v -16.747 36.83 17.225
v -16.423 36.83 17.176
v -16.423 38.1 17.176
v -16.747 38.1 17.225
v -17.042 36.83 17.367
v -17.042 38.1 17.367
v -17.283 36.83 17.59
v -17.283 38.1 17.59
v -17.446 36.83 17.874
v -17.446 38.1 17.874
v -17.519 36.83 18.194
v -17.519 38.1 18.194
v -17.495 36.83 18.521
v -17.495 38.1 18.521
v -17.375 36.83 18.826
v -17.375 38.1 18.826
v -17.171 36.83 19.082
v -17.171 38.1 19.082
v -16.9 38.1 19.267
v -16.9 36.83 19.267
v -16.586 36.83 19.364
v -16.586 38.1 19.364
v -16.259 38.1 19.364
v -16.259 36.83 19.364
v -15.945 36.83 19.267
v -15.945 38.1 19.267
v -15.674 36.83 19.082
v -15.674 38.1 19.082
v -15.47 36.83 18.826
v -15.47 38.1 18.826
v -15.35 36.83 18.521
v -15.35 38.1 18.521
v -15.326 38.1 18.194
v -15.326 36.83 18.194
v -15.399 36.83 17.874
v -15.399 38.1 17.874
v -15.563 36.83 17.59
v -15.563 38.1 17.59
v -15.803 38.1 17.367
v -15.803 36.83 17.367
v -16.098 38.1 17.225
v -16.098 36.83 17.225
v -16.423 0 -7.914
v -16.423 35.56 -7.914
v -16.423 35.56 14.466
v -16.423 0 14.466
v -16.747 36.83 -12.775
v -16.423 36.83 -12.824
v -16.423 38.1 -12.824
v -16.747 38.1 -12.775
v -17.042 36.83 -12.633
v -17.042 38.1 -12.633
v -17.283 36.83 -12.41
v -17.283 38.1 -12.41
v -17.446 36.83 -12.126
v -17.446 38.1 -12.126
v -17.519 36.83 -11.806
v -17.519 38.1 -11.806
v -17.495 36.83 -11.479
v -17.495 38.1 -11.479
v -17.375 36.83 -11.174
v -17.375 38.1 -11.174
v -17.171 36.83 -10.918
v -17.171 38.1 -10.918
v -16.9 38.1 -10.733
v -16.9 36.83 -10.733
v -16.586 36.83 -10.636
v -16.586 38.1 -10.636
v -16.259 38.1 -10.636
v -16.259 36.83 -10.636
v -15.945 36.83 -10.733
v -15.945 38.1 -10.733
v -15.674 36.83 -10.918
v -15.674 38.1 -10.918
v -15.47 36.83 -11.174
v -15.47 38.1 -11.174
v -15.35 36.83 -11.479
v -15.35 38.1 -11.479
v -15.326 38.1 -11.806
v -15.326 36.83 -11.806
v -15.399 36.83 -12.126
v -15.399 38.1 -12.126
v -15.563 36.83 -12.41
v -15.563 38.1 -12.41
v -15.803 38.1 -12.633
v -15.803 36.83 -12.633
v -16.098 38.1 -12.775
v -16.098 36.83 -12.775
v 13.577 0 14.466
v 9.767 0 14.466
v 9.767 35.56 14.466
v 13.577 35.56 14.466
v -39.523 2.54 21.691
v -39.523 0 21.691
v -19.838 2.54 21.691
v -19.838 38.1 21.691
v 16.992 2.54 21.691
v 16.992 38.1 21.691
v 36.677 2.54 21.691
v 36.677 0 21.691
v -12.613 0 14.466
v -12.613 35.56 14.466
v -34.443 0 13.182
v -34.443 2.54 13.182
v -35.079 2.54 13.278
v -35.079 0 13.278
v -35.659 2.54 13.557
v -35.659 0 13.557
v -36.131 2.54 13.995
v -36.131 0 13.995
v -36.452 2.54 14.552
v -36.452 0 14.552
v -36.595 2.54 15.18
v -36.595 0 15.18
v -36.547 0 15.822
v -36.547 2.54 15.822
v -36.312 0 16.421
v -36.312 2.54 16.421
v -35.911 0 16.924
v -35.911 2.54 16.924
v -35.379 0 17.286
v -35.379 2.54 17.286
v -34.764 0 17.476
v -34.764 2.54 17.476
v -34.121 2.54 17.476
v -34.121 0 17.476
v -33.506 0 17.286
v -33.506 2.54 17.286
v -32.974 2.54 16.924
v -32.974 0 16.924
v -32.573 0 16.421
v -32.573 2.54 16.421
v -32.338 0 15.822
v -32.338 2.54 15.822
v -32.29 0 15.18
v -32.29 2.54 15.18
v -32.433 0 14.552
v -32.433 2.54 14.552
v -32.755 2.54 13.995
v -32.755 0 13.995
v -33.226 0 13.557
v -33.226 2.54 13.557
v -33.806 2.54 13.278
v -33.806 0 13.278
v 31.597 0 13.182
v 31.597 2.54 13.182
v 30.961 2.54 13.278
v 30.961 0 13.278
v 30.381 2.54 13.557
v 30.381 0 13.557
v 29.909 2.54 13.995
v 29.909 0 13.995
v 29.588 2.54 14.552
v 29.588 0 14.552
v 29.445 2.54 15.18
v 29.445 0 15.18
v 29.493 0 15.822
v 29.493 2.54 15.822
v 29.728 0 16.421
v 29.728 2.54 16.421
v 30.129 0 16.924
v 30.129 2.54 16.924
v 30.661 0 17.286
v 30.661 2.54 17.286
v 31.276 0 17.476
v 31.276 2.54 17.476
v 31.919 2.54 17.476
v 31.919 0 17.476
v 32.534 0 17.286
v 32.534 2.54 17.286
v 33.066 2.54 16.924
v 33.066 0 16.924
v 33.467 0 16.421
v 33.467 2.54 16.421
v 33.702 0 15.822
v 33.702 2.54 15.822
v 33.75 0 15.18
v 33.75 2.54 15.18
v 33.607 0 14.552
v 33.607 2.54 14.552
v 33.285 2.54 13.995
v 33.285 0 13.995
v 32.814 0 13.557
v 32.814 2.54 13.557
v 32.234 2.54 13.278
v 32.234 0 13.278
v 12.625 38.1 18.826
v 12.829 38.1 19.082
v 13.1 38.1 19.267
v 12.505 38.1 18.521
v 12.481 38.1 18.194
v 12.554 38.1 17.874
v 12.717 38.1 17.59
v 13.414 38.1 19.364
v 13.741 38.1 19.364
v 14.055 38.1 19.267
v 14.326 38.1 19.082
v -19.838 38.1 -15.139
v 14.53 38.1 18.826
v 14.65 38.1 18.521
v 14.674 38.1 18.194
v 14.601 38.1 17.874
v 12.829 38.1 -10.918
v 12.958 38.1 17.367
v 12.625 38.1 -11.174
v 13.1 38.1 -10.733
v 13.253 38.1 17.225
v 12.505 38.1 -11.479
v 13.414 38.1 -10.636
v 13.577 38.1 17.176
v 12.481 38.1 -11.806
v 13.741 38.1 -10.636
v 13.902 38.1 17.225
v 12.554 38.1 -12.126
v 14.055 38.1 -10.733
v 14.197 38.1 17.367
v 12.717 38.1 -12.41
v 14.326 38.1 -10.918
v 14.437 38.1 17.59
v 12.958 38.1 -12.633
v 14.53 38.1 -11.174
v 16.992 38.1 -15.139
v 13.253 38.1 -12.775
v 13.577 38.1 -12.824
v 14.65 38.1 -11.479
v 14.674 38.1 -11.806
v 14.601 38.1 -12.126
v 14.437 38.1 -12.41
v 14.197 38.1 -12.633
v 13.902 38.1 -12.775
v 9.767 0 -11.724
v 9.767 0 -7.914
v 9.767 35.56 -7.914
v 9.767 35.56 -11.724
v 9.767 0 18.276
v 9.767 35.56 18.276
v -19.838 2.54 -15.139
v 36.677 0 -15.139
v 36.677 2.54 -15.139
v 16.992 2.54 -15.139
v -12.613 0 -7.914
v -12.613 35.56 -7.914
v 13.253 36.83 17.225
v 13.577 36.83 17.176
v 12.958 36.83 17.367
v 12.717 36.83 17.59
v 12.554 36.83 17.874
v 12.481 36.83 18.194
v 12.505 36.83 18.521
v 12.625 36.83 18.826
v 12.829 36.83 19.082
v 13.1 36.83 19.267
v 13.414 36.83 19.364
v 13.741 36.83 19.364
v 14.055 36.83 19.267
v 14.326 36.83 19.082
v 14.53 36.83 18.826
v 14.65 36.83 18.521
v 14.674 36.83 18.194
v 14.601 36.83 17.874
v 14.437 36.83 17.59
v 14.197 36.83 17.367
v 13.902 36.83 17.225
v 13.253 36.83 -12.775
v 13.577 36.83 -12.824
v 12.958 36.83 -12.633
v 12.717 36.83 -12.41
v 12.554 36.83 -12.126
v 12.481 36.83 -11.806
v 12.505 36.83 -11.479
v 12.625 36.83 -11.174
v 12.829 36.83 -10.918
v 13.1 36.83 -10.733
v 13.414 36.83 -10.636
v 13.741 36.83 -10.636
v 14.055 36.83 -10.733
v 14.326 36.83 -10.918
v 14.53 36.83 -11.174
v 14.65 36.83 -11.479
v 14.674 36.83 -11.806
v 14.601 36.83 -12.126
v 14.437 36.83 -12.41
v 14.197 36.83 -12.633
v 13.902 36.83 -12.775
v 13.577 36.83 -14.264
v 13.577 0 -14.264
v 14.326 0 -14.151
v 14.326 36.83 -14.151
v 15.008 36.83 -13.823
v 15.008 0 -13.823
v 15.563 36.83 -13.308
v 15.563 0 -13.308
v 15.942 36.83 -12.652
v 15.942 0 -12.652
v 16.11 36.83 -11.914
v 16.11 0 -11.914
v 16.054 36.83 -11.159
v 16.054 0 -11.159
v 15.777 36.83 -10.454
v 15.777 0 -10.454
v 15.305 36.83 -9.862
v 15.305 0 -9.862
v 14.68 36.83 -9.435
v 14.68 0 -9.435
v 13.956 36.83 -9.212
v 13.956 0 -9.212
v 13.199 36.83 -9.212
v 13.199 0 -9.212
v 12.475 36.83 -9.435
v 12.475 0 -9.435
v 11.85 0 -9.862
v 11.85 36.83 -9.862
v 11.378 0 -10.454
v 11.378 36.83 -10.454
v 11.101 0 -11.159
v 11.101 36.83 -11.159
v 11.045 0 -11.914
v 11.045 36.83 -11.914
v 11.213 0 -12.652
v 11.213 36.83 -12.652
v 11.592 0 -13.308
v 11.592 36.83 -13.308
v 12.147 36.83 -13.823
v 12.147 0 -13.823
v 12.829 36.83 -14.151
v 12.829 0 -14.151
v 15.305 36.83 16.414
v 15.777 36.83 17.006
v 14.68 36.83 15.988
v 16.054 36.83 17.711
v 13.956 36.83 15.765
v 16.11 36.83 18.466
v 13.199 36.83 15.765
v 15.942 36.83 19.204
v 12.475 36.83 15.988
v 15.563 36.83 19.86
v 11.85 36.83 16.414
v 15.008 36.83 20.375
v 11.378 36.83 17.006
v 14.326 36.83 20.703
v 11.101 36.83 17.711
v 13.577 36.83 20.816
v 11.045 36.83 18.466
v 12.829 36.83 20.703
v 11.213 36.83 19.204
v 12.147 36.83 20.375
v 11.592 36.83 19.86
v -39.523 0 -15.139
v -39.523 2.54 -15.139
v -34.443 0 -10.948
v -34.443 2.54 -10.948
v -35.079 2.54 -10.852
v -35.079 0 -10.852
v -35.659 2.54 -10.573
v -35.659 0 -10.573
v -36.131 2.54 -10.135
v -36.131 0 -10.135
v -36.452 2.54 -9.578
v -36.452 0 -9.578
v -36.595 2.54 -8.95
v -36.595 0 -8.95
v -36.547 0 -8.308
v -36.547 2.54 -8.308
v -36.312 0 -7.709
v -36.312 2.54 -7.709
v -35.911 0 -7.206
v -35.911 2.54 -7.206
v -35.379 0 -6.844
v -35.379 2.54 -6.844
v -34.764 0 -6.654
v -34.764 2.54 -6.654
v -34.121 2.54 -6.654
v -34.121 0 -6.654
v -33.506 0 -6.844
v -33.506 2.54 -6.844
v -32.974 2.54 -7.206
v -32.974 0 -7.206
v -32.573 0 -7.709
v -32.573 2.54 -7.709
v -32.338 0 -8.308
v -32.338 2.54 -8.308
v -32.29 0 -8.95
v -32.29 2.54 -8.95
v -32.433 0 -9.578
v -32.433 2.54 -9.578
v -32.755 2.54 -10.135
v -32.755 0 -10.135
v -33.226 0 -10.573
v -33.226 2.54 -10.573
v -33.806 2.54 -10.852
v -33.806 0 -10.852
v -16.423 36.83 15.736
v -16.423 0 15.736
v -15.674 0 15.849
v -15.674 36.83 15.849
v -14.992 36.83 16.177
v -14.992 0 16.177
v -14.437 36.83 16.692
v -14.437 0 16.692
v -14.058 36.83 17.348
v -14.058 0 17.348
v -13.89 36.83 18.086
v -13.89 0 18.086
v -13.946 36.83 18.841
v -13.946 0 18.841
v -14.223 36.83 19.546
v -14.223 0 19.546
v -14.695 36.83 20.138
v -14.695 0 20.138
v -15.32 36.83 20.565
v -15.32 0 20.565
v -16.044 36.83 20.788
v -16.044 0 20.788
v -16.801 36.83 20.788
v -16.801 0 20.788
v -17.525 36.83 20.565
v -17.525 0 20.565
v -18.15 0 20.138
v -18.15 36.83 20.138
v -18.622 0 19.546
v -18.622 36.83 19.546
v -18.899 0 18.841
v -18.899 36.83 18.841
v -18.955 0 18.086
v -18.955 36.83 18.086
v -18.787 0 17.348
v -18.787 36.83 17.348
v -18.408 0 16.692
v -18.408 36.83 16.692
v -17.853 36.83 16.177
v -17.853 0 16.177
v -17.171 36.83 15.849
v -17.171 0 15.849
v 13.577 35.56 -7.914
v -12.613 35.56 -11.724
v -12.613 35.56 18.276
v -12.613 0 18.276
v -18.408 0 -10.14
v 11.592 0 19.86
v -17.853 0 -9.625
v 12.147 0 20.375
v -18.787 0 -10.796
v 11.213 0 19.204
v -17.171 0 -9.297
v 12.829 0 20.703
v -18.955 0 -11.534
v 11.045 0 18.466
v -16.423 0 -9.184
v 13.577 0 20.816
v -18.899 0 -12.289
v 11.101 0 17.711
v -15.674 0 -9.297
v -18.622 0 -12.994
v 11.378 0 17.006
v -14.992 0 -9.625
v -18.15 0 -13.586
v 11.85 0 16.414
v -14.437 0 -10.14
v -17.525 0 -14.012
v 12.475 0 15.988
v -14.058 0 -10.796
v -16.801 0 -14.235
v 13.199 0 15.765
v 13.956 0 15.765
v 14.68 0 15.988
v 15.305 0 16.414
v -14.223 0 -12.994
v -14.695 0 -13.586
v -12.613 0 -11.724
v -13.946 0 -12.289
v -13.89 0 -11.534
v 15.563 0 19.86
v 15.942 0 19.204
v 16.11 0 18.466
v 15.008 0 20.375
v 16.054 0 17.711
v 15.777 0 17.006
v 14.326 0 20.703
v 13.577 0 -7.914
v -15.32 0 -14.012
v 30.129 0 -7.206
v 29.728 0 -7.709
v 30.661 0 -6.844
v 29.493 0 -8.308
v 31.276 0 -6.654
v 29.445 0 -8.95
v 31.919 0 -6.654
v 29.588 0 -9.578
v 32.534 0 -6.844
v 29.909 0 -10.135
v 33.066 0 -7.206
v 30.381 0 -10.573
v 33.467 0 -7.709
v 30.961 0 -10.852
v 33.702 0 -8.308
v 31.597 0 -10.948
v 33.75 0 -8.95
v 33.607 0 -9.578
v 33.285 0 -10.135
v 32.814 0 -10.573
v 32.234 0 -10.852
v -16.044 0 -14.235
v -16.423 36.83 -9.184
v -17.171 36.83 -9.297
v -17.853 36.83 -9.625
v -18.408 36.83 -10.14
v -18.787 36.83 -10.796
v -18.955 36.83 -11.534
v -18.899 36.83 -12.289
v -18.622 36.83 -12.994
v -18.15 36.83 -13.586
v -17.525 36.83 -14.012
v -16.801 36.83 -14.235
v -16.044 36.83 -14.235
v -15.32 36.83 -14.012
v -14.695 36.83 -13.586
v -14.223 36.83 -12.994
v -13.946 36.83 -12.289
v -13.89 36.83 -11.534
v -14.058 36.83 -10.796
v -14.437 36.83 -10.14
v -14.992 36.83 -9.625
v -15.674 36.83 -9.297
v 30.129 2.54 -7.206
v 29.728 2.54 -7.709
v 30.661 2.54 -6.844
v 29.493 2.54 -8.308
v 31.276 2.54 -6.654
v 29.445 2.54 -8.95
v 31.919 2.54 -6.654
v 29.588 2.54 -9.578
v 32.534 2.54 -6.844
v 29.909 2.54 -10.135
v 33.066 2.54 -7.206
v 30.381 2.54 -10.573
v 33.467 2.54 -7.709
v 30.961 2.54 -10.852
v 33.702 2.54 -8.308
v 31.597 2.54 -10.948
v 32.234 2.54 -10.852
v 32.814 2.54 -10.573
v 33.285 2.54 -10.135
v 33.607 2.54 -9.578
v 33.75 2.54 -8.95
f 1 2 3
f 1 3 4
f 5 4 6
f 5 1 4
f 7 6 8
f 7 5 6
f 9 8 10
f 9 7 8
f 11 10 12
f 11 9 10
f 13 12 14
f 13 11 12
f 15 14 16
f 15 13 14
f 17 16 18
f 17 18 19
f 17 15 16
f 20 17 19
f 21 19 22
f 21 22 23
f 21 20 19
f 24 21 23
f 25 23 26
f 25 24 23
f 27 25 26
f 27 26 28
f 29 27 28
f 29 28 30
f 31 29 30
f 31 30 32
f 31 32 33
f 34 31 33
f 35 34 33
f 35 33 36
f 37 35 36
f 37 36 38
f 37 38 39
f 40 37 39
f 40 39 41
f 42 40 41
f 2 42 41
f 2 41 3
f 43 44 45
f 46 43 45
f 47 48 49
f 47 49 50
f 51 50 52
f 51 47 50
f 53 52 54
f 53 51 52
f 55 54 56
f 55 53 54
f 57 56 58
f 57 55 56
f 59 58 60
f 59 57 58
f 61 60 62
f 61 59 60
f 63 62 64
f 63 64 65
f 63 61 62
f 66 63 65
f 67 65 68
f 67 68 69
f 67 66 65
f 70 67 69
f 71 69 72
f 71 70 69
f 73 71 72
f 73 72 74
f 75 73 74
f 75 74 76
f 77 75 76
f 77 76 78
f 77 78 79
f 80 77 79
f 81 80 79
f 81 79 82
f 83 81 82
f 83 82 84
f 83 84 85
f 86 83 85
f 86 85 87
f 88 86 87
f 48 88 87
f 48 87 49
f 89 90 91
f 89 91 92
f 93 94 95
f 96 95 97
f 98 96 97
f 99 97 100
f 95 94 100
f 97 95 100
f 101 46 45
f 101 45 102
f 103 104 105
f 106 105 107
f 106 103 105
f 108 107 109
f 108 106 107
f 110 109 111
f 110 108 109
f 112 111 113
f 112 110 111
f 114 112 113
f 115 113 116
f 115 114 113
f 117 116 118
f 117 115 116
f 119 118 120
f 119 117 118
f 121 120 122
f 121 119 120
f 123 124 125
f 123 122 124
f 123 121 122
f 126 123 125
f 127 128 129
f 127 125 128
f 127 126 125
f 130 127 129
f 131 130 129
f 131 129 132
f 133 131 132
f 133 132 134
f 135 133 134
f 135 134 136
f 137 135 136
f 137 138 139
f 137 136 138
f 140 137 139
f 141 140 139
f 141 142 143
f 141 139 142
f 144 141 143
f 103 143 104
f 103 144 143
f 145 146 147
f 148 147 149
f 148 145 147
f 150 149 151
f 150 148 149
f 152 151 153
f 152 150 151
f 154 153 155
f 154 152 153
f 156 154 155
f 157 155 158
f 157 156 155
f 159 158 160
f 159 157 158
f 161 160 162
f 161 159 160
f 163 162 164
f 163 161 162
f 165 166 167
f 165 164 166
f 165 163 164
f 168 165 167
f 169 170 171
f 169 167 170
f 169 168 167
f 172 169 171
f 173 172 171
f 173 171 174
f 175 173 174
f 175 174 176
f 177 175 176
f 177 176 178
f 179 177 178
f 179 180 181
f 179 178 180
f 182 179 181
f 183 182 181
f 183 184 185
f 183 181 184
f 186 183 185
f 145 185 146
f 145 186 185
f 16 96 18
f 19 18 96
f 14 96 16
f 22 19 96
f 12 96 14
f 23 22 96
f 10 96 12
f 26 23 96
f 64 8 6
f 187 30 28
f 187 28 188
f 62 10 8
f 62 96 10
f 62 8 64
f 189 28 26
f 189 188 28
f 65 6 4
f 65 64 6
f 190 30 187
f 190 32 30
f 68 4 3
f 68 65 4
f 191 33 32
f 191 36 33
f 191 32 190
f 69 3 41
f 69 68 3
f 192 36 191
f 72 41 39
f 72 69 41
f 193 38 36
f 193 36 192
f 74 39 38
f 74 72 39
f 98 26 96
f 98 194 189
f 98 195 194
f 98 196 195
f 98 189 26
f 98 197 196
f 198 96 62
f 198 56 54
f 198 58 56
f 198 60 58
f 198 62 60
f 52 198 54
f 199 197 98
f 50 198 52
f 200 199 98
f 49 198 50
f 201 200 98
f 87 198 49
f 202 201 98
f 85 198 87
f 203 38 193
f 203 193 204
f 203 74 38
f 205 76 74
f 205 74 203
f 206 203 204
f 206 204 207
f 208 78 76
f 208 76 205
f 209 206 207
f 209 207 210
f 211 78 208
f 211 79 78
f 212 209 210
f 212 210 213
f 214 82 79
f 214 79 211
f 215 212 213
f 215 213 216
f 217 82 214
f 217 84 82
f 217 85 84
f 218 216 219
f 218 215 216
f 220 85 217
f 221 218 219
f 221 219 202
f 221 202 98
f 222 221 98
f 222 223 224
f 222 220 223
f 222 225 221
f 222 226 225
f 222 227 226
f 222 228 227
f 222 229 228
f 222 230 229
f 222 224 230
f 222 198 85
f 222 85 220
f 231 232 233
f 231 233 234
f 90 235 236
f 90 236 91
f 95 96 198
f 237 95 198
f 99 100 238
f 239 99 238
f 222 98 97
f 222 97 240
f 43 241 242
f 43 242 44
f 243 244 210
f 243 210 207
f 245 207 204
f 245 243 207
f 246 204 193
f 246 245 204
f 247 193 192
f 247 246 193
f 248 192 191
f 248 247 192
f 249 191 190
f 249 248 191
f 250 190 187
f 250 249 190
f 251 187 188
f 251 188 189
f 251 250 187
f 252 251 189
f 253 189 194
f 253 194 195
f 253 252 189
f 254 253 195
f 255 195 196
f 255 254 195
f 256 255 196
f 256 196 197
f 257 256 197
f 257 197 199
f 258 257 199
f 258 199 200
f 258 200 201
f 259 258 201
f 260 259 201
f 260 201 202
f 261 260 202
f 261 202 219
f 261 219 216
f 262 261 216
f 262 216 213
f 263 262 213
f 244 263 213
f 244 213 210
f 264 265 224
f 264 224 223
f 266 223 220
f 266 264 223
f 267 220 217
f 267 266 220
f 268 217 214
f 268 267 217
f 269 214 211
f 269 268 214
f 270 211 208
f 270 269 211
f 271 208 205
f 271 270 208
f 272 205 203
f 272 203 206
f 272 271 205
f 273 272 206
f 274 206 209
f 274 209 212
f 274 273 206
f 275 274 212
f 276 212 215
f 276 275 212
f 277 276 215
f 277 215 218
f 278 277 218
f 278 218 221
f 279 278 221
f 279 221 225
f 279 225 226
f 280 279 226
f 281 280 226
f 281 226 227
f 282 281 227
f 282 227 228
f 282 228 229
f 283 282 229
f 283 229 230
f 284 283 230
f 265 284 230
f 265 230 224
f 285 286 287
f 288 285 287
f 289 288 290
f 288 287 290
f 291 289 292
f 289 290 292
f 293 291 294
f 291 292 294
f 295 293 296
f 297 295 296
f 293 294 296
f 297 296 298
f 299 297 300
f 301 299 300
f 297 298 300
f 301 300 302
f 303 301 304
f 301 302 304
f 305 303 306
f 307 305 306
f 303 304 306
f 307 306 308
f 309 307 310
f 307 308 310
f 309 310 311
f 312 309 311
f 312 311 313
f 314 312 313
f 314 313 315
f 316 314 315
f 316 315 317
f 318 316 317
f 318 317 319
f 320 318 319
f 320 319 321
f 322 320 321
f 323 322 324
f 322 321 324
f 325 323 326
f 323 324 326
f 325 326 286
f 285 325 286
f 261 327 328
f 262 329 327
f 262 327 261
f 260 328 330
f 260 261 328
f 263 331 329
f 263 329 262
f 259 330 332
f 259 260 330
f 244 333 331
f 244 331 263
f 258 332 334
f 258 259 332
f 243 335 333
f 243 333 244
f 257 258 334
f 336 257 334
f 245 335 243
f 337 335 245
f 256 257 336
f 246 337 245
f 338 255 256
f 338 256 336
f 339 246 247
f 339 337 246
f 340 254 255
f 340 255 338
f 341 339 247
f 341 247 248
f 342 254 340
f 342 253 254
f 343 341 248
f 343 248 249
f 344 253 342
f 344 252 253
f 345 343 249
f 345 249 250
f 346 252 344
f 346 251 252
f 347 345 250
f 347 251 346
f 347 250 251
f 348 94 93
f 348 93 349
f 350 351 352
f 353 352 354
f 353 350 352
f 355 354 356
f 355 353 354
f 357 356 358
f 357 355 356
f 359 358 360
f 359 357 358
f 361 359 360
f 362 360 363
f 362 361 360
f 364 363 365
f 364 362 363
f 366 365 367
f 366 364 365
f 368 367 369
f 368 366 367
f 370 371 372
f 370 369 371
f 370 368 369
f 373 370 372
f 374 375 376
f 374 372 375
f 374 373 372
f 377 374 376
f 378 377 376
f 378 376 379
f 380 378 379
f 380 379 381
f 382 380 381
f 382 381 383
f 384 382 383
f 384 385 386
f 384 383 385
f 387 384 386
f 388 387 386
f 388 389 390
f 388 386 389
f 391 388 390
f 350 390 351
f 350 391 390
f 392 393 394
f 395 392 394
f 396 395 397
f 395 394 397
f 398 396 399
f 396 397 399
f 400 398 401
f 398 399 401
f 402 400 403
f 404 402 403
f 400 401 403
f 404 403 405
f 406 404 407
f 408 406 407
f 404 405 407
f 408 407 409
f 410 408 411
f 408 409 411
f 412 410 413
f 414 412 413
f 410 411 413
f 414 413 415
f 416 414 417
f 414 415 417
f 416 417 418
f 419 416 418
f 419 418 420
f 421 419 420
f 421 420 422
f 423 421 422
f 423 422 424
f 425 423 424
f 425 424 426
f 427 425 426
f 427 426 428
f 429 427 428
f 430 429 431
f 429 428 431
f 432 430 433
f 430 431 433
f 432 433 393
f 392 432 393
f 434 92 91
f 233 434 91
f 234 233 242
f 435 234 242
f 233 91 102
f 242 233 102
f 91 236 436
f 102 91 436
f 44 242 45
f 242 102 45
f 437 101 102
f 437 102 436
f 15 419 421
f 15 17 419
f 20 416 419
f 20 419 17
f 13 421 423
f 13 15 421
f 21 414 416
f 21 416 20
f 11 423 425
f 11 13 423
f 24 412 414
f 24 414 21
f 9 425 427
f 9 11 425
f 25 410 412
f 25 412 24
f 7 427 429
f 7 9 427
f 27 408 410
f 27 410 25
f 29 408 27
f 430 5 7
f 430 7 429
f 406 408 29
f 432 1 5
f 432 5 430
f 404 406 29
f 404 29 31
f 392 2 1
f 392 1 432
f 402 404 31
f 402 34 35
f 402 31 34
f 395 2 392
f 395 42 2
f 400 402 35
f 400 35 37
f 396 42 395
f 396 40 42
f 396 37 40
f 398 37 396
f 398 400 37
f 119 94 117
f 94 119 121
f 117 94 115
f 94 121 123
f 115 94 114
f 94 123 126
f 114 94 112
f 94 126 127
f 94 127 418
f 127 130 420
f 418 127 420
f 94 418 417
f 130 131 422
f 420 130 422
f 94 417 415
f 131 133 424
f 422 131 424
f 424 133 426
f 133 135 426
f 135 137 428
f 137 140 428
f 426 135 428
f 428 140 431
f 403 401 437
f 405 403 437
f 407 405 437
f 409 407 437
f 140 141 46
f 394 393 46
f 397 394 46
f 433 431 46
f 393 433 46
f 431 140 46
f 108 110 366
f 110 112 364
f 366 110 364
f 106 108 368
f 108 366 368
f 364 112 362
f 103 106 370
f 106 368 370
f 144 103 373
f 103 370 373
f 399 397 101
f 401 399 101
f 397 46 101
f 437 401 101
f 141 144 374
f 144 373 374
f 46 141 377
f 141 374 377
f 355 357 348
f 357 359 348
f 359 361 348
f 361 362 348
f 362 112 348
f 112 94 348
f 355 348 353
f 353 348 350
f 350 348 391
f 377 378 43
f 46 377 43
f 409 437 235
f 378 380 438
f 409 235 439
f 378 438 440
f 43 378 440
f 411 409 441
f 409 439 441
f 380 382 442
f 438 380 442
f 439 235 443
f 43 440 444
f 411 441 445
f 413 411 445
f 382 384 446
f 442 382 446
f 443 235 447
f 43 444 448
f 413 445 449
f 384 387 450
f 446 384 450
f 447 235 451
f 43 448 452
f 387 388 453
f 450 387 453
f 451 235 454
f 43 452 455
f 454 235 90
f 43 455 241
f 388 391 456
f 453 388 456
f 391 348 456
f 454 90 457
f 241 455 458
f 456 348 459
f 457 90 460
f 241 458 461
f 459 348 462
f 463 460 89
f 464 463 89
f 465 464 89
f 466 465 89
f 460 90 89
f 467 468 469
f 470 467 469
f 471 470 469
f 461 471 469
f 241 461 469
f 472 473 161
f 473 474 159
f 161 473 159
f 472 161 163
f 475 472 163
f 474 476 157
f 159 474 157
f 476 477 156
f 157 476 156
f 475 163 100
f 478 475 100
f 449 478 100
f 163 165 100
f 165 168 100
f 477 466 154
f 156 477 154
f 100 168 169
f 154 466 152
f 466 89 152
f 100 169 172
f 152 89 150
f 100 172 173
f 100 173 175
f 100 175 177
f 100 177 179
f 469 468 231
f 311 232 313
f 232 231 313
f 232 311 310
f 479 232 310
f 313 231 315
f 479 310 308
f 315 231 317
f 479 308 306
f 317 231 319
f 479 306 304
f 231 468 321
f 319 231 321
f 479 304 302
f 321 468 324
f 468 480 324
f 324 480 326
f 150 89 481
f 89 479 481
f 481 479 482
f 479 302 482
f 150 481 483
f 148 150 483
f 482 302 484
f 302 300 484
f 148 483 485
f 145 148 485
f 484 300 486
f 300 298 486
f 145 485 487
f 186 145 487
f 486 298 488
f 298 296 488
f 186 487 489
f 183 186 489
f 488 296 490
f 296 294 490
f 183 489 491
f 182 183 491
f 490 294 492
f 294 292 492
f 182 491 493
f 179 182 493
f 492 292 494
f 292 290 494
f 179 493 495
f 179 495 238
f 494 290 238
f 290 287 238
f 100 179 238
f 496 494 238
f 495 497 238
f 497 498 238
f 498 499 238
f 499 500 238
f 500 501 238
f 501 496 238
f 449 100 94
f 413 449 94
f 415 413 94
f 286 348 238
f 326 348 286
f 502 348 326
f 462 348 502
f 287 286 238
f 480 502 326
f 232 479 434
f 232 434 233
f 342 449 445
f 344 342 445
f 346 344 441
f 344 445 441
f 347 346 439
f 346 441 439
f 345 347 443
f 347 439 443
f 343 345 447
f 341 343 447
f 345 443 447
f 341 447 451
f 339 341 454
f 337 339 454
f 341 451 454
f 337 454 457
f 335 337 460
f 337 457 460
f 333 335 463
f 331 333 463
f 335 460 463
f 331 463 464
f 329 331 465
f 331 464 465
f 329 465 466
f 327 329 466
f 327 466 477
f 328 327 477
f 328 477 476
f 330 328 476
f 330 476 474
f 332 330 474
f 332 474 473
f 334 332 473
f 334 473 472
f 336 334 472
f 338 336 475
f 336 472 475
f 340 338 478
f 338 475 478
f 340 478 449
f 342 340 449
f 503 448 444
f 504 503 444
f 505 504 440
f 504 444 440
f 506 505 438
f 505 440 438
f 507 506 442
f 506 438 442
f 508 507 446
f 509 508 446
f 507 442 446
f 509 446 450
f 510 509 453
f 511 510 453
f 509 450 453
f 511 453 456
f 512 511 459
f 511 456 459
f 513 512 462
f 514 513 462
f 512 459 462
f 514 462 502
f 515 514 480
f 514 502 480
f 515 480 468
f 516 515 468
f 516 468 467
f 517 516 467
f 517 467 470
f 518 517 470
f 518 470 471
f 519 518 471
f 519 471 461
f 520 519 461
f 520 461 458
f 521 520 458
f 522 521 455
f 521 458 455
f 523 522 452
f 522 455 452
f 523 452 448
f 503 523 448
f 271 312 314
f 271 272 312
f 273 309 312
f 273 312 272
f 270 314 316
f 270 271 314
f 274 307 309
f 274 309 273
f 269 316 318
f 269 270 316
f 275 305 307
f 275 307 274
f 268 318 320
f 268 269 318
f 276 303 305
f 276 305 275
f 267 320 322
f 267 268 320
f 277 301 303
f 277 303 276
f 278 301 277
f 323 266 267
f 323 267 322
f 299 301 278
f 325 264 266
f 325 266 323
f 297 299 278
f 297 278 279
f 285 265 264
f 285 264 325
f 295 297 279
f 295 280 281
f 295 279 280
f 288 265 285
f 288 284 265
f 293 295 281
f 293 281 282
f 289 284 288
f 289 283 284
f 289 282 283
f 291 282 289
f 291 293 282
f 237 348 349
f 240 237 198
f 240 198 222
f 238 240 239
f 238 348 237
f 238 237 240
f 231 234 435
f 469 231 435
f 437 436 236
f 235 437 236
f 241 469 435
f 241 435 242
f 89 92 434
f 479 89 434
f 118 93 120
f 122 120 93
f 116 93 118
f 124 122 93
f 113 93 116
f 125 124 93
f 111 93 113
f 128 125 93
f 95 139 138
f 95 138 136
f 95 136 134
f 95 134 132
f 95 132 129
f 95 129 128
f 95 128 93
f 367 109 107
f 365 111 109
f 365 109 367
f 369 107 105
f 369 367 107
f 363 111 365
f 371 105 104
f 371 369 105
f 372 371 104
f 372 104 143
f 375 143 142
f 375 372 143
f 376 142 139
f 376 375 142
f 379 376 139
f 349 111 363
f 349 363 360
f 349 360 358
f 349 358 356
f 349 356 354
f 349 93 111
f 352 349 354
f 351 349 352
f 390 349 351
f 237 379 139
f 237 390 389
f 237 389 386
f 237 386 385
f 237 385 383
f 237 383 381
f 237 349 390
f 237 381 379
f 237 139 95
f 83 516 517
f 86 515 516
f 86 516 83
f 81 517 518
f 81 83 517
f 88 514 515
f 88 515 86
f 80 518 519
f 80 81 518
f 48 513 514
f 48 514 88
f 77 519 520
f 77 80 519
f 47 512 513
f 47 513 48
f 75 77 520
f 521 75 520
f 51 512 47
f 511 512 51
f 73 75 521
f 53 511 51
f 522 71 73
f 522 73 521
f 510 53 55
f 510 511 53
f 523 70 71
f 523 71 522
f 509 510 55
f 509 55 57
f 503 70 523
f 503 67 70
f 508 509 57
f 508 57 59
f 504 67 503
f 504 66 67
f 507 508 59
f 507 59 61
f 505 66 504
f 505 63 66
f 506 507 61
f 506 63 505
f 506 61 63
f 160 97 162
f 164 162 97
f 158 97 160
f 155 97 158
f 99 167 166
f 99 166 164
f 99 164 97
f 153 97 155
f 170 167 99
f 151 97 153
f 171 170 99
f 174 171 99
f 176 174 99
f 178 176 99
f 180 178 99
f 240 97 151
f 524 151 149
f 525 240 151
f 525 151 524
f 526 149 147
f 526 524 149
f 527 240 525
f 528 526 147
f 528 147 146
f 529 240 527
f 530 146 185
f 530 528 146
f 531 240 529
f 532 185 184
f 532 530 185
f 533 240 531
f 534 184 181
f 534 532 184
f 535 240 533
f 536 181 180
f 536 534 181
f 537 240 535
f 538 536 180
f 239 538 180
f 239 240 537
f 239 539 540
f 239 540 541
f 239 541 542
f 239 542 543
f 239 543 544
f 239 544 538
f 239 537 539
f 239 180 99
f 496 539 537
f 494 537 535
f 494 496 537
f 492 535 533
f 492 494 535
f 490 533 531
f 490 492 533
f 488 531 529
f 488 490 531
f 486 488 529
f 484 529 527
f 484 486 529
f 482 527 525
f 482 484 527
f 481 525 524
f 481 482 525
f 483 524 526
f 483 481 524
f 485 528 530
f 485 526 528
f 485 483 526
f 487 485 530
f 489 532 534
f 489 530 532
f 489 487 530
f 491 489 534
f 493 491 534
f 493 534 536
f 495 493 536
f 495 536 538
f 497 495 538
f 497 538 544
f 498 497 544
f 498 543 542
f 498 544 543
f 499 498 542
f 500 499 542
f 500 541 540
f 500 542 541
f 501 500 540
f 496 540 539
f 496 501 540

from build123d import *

# Parameters (mm, degrees)
SKETCH1_W           = 76.2
SKETCH1_H           = 36.83
SKETCH1_R           = 1.0999978
SKETCH1_R_2         = 2.159
BOSS_EXTRUDE1_DEPTH = 38.1
SKETCH3_R           = 2.54
CUT_EXTRUDE2_DEPTH  = 36.83
SKETCH4_W           = 19.685
SKETCH4_H           = 36.83
CUT_EXTRUDE3_DEPTH  = 35.56
CUT_EXTRUDE4_DEPTH  = 35.56


with BuildPart() as part:
    # Sketch1 → Boss-Extrude1 (new body)
    with BuildSketch(Plane(origin=(0, 0, 0), x_dir=(1, 0, 0), z_dir=(0, 1, 0))):
        with Locations((-1.422532637, -3.27613577)):
            Rectangle(SKETCH1_W, SKETCH1_H)
        with Locations(Location((-16.422528037, 11.72385963, 0), (0, 0, 90))):
            Circle(SKETCH1_R, mode=Mode.SUBTRACT)
        with Locations(Location((13.577462763, 11.72385963, 0), (0, 0, 90))):
            Circle(SKETCH1_R, mode=Mode.SUBTRACT)
        with Locations(Location((13.577462763, -18.27613117, 0), (0, 0, 90))):
            Circle(SKETCH1_R, mode=Mode.SUBTRACT)
        with Locations(Location((-16.422528037, -18.27613117, 0), (0, 0, 90))):
            Circle(SKETCH1_R, mode=Mode.SUBTRACT)
        with Locations(Location((31.597467363, -15.34113577, 0), (0, 0, 90))):
            Circle(SKETCH1_R_2, mode=Mode.SUBTRACT)
        with Locations(Location((31.597467363, 8.78886423, 0), (0, 0, 90))):
            Circle(SKETCH1_R_2, mode=Mode.SUBTRACT)
        with Locations(Location((-34.442532637, -15.34113577, 0), (0, 0, 90))):
            Circle(SKETCH1_R_2, mode=Mode.SUBTRACT)
        with Locations(Location((-34.442532637, 8.78886423, 0), (0, 0, 90))):
            Circle(SKETCH1_R_2, mode=Mode.SUBTRACT)
    extrude(amount=BOSS_EXTRUDE1_DEPTH)

    # Sketch3 → Cut-Extrude2 (cut)
    with BuildSketch(Plane.XZ):
        with Locations(Location((-16.422528037, 18.27613117, 0), (0, 0, 270))):
            Circle(SKETCH3_R)
        with Locations(Location((13.577462763, 18.27613117, 0), (0, 0, 90))):
            Circle(SKETCH3_R)
        with Locations(Location((13.577462763, -11.72385963, 0), (0, 0, 270))):
            Circle(SKETCH3_R)
        with Locations(Location((-16.422528037, -11.72385963, 0), (0, 0, 90))):
            Circle(SKETCH3_R)
    extrude(amount=-CUT_EXTRUDE2_DEPTH, mode=Mode.SUBTRACT)

    # Sketch4 → Cut-Extrude3 (cut)
    with BuildSketch(Plane(origin=(0, 38.1, 0), x_dir=(1, 0, 0), z_dir=(0, 1, 0))):
        with Locations((-29.680032637, -3.27613577)):
            Rectangle(SKETCH4_W, SKETCH4_H)
        with Locations((26.834967363, -3.27613577)):
            Rectangle(SKETCH4_W, SKETCH4_H)
    extrude(amount=-CUT_EXTRUDE3_DEPTH, mode=Mode.SUBTRACT)

    # Sketch5 → Cut-Extrude4 (cut)
    with BuildSketch(Plane.XZ):
        Polygon((9.767462763, -7.91385963), (9.767462763, -11.72385963), (-12.612528037, -11.72385963), (-12.612528037, -7.91385963), (-16.422528037, -7.91385963), (-16.422528037, 14.46613117), (-12.612528037, 14.46613117), (-12.612528037, 18.27613117), (9.767462763, 18.27613117), (9.767462763, 14.46613117), (13.577462763, 14.46613117), (13.577462763, -7.91385963), align=None)
    extrude(amount=-CUT_EXTRUDE4_DEPTH, mode=Mode.SUBTRACT)


solid = part.part
